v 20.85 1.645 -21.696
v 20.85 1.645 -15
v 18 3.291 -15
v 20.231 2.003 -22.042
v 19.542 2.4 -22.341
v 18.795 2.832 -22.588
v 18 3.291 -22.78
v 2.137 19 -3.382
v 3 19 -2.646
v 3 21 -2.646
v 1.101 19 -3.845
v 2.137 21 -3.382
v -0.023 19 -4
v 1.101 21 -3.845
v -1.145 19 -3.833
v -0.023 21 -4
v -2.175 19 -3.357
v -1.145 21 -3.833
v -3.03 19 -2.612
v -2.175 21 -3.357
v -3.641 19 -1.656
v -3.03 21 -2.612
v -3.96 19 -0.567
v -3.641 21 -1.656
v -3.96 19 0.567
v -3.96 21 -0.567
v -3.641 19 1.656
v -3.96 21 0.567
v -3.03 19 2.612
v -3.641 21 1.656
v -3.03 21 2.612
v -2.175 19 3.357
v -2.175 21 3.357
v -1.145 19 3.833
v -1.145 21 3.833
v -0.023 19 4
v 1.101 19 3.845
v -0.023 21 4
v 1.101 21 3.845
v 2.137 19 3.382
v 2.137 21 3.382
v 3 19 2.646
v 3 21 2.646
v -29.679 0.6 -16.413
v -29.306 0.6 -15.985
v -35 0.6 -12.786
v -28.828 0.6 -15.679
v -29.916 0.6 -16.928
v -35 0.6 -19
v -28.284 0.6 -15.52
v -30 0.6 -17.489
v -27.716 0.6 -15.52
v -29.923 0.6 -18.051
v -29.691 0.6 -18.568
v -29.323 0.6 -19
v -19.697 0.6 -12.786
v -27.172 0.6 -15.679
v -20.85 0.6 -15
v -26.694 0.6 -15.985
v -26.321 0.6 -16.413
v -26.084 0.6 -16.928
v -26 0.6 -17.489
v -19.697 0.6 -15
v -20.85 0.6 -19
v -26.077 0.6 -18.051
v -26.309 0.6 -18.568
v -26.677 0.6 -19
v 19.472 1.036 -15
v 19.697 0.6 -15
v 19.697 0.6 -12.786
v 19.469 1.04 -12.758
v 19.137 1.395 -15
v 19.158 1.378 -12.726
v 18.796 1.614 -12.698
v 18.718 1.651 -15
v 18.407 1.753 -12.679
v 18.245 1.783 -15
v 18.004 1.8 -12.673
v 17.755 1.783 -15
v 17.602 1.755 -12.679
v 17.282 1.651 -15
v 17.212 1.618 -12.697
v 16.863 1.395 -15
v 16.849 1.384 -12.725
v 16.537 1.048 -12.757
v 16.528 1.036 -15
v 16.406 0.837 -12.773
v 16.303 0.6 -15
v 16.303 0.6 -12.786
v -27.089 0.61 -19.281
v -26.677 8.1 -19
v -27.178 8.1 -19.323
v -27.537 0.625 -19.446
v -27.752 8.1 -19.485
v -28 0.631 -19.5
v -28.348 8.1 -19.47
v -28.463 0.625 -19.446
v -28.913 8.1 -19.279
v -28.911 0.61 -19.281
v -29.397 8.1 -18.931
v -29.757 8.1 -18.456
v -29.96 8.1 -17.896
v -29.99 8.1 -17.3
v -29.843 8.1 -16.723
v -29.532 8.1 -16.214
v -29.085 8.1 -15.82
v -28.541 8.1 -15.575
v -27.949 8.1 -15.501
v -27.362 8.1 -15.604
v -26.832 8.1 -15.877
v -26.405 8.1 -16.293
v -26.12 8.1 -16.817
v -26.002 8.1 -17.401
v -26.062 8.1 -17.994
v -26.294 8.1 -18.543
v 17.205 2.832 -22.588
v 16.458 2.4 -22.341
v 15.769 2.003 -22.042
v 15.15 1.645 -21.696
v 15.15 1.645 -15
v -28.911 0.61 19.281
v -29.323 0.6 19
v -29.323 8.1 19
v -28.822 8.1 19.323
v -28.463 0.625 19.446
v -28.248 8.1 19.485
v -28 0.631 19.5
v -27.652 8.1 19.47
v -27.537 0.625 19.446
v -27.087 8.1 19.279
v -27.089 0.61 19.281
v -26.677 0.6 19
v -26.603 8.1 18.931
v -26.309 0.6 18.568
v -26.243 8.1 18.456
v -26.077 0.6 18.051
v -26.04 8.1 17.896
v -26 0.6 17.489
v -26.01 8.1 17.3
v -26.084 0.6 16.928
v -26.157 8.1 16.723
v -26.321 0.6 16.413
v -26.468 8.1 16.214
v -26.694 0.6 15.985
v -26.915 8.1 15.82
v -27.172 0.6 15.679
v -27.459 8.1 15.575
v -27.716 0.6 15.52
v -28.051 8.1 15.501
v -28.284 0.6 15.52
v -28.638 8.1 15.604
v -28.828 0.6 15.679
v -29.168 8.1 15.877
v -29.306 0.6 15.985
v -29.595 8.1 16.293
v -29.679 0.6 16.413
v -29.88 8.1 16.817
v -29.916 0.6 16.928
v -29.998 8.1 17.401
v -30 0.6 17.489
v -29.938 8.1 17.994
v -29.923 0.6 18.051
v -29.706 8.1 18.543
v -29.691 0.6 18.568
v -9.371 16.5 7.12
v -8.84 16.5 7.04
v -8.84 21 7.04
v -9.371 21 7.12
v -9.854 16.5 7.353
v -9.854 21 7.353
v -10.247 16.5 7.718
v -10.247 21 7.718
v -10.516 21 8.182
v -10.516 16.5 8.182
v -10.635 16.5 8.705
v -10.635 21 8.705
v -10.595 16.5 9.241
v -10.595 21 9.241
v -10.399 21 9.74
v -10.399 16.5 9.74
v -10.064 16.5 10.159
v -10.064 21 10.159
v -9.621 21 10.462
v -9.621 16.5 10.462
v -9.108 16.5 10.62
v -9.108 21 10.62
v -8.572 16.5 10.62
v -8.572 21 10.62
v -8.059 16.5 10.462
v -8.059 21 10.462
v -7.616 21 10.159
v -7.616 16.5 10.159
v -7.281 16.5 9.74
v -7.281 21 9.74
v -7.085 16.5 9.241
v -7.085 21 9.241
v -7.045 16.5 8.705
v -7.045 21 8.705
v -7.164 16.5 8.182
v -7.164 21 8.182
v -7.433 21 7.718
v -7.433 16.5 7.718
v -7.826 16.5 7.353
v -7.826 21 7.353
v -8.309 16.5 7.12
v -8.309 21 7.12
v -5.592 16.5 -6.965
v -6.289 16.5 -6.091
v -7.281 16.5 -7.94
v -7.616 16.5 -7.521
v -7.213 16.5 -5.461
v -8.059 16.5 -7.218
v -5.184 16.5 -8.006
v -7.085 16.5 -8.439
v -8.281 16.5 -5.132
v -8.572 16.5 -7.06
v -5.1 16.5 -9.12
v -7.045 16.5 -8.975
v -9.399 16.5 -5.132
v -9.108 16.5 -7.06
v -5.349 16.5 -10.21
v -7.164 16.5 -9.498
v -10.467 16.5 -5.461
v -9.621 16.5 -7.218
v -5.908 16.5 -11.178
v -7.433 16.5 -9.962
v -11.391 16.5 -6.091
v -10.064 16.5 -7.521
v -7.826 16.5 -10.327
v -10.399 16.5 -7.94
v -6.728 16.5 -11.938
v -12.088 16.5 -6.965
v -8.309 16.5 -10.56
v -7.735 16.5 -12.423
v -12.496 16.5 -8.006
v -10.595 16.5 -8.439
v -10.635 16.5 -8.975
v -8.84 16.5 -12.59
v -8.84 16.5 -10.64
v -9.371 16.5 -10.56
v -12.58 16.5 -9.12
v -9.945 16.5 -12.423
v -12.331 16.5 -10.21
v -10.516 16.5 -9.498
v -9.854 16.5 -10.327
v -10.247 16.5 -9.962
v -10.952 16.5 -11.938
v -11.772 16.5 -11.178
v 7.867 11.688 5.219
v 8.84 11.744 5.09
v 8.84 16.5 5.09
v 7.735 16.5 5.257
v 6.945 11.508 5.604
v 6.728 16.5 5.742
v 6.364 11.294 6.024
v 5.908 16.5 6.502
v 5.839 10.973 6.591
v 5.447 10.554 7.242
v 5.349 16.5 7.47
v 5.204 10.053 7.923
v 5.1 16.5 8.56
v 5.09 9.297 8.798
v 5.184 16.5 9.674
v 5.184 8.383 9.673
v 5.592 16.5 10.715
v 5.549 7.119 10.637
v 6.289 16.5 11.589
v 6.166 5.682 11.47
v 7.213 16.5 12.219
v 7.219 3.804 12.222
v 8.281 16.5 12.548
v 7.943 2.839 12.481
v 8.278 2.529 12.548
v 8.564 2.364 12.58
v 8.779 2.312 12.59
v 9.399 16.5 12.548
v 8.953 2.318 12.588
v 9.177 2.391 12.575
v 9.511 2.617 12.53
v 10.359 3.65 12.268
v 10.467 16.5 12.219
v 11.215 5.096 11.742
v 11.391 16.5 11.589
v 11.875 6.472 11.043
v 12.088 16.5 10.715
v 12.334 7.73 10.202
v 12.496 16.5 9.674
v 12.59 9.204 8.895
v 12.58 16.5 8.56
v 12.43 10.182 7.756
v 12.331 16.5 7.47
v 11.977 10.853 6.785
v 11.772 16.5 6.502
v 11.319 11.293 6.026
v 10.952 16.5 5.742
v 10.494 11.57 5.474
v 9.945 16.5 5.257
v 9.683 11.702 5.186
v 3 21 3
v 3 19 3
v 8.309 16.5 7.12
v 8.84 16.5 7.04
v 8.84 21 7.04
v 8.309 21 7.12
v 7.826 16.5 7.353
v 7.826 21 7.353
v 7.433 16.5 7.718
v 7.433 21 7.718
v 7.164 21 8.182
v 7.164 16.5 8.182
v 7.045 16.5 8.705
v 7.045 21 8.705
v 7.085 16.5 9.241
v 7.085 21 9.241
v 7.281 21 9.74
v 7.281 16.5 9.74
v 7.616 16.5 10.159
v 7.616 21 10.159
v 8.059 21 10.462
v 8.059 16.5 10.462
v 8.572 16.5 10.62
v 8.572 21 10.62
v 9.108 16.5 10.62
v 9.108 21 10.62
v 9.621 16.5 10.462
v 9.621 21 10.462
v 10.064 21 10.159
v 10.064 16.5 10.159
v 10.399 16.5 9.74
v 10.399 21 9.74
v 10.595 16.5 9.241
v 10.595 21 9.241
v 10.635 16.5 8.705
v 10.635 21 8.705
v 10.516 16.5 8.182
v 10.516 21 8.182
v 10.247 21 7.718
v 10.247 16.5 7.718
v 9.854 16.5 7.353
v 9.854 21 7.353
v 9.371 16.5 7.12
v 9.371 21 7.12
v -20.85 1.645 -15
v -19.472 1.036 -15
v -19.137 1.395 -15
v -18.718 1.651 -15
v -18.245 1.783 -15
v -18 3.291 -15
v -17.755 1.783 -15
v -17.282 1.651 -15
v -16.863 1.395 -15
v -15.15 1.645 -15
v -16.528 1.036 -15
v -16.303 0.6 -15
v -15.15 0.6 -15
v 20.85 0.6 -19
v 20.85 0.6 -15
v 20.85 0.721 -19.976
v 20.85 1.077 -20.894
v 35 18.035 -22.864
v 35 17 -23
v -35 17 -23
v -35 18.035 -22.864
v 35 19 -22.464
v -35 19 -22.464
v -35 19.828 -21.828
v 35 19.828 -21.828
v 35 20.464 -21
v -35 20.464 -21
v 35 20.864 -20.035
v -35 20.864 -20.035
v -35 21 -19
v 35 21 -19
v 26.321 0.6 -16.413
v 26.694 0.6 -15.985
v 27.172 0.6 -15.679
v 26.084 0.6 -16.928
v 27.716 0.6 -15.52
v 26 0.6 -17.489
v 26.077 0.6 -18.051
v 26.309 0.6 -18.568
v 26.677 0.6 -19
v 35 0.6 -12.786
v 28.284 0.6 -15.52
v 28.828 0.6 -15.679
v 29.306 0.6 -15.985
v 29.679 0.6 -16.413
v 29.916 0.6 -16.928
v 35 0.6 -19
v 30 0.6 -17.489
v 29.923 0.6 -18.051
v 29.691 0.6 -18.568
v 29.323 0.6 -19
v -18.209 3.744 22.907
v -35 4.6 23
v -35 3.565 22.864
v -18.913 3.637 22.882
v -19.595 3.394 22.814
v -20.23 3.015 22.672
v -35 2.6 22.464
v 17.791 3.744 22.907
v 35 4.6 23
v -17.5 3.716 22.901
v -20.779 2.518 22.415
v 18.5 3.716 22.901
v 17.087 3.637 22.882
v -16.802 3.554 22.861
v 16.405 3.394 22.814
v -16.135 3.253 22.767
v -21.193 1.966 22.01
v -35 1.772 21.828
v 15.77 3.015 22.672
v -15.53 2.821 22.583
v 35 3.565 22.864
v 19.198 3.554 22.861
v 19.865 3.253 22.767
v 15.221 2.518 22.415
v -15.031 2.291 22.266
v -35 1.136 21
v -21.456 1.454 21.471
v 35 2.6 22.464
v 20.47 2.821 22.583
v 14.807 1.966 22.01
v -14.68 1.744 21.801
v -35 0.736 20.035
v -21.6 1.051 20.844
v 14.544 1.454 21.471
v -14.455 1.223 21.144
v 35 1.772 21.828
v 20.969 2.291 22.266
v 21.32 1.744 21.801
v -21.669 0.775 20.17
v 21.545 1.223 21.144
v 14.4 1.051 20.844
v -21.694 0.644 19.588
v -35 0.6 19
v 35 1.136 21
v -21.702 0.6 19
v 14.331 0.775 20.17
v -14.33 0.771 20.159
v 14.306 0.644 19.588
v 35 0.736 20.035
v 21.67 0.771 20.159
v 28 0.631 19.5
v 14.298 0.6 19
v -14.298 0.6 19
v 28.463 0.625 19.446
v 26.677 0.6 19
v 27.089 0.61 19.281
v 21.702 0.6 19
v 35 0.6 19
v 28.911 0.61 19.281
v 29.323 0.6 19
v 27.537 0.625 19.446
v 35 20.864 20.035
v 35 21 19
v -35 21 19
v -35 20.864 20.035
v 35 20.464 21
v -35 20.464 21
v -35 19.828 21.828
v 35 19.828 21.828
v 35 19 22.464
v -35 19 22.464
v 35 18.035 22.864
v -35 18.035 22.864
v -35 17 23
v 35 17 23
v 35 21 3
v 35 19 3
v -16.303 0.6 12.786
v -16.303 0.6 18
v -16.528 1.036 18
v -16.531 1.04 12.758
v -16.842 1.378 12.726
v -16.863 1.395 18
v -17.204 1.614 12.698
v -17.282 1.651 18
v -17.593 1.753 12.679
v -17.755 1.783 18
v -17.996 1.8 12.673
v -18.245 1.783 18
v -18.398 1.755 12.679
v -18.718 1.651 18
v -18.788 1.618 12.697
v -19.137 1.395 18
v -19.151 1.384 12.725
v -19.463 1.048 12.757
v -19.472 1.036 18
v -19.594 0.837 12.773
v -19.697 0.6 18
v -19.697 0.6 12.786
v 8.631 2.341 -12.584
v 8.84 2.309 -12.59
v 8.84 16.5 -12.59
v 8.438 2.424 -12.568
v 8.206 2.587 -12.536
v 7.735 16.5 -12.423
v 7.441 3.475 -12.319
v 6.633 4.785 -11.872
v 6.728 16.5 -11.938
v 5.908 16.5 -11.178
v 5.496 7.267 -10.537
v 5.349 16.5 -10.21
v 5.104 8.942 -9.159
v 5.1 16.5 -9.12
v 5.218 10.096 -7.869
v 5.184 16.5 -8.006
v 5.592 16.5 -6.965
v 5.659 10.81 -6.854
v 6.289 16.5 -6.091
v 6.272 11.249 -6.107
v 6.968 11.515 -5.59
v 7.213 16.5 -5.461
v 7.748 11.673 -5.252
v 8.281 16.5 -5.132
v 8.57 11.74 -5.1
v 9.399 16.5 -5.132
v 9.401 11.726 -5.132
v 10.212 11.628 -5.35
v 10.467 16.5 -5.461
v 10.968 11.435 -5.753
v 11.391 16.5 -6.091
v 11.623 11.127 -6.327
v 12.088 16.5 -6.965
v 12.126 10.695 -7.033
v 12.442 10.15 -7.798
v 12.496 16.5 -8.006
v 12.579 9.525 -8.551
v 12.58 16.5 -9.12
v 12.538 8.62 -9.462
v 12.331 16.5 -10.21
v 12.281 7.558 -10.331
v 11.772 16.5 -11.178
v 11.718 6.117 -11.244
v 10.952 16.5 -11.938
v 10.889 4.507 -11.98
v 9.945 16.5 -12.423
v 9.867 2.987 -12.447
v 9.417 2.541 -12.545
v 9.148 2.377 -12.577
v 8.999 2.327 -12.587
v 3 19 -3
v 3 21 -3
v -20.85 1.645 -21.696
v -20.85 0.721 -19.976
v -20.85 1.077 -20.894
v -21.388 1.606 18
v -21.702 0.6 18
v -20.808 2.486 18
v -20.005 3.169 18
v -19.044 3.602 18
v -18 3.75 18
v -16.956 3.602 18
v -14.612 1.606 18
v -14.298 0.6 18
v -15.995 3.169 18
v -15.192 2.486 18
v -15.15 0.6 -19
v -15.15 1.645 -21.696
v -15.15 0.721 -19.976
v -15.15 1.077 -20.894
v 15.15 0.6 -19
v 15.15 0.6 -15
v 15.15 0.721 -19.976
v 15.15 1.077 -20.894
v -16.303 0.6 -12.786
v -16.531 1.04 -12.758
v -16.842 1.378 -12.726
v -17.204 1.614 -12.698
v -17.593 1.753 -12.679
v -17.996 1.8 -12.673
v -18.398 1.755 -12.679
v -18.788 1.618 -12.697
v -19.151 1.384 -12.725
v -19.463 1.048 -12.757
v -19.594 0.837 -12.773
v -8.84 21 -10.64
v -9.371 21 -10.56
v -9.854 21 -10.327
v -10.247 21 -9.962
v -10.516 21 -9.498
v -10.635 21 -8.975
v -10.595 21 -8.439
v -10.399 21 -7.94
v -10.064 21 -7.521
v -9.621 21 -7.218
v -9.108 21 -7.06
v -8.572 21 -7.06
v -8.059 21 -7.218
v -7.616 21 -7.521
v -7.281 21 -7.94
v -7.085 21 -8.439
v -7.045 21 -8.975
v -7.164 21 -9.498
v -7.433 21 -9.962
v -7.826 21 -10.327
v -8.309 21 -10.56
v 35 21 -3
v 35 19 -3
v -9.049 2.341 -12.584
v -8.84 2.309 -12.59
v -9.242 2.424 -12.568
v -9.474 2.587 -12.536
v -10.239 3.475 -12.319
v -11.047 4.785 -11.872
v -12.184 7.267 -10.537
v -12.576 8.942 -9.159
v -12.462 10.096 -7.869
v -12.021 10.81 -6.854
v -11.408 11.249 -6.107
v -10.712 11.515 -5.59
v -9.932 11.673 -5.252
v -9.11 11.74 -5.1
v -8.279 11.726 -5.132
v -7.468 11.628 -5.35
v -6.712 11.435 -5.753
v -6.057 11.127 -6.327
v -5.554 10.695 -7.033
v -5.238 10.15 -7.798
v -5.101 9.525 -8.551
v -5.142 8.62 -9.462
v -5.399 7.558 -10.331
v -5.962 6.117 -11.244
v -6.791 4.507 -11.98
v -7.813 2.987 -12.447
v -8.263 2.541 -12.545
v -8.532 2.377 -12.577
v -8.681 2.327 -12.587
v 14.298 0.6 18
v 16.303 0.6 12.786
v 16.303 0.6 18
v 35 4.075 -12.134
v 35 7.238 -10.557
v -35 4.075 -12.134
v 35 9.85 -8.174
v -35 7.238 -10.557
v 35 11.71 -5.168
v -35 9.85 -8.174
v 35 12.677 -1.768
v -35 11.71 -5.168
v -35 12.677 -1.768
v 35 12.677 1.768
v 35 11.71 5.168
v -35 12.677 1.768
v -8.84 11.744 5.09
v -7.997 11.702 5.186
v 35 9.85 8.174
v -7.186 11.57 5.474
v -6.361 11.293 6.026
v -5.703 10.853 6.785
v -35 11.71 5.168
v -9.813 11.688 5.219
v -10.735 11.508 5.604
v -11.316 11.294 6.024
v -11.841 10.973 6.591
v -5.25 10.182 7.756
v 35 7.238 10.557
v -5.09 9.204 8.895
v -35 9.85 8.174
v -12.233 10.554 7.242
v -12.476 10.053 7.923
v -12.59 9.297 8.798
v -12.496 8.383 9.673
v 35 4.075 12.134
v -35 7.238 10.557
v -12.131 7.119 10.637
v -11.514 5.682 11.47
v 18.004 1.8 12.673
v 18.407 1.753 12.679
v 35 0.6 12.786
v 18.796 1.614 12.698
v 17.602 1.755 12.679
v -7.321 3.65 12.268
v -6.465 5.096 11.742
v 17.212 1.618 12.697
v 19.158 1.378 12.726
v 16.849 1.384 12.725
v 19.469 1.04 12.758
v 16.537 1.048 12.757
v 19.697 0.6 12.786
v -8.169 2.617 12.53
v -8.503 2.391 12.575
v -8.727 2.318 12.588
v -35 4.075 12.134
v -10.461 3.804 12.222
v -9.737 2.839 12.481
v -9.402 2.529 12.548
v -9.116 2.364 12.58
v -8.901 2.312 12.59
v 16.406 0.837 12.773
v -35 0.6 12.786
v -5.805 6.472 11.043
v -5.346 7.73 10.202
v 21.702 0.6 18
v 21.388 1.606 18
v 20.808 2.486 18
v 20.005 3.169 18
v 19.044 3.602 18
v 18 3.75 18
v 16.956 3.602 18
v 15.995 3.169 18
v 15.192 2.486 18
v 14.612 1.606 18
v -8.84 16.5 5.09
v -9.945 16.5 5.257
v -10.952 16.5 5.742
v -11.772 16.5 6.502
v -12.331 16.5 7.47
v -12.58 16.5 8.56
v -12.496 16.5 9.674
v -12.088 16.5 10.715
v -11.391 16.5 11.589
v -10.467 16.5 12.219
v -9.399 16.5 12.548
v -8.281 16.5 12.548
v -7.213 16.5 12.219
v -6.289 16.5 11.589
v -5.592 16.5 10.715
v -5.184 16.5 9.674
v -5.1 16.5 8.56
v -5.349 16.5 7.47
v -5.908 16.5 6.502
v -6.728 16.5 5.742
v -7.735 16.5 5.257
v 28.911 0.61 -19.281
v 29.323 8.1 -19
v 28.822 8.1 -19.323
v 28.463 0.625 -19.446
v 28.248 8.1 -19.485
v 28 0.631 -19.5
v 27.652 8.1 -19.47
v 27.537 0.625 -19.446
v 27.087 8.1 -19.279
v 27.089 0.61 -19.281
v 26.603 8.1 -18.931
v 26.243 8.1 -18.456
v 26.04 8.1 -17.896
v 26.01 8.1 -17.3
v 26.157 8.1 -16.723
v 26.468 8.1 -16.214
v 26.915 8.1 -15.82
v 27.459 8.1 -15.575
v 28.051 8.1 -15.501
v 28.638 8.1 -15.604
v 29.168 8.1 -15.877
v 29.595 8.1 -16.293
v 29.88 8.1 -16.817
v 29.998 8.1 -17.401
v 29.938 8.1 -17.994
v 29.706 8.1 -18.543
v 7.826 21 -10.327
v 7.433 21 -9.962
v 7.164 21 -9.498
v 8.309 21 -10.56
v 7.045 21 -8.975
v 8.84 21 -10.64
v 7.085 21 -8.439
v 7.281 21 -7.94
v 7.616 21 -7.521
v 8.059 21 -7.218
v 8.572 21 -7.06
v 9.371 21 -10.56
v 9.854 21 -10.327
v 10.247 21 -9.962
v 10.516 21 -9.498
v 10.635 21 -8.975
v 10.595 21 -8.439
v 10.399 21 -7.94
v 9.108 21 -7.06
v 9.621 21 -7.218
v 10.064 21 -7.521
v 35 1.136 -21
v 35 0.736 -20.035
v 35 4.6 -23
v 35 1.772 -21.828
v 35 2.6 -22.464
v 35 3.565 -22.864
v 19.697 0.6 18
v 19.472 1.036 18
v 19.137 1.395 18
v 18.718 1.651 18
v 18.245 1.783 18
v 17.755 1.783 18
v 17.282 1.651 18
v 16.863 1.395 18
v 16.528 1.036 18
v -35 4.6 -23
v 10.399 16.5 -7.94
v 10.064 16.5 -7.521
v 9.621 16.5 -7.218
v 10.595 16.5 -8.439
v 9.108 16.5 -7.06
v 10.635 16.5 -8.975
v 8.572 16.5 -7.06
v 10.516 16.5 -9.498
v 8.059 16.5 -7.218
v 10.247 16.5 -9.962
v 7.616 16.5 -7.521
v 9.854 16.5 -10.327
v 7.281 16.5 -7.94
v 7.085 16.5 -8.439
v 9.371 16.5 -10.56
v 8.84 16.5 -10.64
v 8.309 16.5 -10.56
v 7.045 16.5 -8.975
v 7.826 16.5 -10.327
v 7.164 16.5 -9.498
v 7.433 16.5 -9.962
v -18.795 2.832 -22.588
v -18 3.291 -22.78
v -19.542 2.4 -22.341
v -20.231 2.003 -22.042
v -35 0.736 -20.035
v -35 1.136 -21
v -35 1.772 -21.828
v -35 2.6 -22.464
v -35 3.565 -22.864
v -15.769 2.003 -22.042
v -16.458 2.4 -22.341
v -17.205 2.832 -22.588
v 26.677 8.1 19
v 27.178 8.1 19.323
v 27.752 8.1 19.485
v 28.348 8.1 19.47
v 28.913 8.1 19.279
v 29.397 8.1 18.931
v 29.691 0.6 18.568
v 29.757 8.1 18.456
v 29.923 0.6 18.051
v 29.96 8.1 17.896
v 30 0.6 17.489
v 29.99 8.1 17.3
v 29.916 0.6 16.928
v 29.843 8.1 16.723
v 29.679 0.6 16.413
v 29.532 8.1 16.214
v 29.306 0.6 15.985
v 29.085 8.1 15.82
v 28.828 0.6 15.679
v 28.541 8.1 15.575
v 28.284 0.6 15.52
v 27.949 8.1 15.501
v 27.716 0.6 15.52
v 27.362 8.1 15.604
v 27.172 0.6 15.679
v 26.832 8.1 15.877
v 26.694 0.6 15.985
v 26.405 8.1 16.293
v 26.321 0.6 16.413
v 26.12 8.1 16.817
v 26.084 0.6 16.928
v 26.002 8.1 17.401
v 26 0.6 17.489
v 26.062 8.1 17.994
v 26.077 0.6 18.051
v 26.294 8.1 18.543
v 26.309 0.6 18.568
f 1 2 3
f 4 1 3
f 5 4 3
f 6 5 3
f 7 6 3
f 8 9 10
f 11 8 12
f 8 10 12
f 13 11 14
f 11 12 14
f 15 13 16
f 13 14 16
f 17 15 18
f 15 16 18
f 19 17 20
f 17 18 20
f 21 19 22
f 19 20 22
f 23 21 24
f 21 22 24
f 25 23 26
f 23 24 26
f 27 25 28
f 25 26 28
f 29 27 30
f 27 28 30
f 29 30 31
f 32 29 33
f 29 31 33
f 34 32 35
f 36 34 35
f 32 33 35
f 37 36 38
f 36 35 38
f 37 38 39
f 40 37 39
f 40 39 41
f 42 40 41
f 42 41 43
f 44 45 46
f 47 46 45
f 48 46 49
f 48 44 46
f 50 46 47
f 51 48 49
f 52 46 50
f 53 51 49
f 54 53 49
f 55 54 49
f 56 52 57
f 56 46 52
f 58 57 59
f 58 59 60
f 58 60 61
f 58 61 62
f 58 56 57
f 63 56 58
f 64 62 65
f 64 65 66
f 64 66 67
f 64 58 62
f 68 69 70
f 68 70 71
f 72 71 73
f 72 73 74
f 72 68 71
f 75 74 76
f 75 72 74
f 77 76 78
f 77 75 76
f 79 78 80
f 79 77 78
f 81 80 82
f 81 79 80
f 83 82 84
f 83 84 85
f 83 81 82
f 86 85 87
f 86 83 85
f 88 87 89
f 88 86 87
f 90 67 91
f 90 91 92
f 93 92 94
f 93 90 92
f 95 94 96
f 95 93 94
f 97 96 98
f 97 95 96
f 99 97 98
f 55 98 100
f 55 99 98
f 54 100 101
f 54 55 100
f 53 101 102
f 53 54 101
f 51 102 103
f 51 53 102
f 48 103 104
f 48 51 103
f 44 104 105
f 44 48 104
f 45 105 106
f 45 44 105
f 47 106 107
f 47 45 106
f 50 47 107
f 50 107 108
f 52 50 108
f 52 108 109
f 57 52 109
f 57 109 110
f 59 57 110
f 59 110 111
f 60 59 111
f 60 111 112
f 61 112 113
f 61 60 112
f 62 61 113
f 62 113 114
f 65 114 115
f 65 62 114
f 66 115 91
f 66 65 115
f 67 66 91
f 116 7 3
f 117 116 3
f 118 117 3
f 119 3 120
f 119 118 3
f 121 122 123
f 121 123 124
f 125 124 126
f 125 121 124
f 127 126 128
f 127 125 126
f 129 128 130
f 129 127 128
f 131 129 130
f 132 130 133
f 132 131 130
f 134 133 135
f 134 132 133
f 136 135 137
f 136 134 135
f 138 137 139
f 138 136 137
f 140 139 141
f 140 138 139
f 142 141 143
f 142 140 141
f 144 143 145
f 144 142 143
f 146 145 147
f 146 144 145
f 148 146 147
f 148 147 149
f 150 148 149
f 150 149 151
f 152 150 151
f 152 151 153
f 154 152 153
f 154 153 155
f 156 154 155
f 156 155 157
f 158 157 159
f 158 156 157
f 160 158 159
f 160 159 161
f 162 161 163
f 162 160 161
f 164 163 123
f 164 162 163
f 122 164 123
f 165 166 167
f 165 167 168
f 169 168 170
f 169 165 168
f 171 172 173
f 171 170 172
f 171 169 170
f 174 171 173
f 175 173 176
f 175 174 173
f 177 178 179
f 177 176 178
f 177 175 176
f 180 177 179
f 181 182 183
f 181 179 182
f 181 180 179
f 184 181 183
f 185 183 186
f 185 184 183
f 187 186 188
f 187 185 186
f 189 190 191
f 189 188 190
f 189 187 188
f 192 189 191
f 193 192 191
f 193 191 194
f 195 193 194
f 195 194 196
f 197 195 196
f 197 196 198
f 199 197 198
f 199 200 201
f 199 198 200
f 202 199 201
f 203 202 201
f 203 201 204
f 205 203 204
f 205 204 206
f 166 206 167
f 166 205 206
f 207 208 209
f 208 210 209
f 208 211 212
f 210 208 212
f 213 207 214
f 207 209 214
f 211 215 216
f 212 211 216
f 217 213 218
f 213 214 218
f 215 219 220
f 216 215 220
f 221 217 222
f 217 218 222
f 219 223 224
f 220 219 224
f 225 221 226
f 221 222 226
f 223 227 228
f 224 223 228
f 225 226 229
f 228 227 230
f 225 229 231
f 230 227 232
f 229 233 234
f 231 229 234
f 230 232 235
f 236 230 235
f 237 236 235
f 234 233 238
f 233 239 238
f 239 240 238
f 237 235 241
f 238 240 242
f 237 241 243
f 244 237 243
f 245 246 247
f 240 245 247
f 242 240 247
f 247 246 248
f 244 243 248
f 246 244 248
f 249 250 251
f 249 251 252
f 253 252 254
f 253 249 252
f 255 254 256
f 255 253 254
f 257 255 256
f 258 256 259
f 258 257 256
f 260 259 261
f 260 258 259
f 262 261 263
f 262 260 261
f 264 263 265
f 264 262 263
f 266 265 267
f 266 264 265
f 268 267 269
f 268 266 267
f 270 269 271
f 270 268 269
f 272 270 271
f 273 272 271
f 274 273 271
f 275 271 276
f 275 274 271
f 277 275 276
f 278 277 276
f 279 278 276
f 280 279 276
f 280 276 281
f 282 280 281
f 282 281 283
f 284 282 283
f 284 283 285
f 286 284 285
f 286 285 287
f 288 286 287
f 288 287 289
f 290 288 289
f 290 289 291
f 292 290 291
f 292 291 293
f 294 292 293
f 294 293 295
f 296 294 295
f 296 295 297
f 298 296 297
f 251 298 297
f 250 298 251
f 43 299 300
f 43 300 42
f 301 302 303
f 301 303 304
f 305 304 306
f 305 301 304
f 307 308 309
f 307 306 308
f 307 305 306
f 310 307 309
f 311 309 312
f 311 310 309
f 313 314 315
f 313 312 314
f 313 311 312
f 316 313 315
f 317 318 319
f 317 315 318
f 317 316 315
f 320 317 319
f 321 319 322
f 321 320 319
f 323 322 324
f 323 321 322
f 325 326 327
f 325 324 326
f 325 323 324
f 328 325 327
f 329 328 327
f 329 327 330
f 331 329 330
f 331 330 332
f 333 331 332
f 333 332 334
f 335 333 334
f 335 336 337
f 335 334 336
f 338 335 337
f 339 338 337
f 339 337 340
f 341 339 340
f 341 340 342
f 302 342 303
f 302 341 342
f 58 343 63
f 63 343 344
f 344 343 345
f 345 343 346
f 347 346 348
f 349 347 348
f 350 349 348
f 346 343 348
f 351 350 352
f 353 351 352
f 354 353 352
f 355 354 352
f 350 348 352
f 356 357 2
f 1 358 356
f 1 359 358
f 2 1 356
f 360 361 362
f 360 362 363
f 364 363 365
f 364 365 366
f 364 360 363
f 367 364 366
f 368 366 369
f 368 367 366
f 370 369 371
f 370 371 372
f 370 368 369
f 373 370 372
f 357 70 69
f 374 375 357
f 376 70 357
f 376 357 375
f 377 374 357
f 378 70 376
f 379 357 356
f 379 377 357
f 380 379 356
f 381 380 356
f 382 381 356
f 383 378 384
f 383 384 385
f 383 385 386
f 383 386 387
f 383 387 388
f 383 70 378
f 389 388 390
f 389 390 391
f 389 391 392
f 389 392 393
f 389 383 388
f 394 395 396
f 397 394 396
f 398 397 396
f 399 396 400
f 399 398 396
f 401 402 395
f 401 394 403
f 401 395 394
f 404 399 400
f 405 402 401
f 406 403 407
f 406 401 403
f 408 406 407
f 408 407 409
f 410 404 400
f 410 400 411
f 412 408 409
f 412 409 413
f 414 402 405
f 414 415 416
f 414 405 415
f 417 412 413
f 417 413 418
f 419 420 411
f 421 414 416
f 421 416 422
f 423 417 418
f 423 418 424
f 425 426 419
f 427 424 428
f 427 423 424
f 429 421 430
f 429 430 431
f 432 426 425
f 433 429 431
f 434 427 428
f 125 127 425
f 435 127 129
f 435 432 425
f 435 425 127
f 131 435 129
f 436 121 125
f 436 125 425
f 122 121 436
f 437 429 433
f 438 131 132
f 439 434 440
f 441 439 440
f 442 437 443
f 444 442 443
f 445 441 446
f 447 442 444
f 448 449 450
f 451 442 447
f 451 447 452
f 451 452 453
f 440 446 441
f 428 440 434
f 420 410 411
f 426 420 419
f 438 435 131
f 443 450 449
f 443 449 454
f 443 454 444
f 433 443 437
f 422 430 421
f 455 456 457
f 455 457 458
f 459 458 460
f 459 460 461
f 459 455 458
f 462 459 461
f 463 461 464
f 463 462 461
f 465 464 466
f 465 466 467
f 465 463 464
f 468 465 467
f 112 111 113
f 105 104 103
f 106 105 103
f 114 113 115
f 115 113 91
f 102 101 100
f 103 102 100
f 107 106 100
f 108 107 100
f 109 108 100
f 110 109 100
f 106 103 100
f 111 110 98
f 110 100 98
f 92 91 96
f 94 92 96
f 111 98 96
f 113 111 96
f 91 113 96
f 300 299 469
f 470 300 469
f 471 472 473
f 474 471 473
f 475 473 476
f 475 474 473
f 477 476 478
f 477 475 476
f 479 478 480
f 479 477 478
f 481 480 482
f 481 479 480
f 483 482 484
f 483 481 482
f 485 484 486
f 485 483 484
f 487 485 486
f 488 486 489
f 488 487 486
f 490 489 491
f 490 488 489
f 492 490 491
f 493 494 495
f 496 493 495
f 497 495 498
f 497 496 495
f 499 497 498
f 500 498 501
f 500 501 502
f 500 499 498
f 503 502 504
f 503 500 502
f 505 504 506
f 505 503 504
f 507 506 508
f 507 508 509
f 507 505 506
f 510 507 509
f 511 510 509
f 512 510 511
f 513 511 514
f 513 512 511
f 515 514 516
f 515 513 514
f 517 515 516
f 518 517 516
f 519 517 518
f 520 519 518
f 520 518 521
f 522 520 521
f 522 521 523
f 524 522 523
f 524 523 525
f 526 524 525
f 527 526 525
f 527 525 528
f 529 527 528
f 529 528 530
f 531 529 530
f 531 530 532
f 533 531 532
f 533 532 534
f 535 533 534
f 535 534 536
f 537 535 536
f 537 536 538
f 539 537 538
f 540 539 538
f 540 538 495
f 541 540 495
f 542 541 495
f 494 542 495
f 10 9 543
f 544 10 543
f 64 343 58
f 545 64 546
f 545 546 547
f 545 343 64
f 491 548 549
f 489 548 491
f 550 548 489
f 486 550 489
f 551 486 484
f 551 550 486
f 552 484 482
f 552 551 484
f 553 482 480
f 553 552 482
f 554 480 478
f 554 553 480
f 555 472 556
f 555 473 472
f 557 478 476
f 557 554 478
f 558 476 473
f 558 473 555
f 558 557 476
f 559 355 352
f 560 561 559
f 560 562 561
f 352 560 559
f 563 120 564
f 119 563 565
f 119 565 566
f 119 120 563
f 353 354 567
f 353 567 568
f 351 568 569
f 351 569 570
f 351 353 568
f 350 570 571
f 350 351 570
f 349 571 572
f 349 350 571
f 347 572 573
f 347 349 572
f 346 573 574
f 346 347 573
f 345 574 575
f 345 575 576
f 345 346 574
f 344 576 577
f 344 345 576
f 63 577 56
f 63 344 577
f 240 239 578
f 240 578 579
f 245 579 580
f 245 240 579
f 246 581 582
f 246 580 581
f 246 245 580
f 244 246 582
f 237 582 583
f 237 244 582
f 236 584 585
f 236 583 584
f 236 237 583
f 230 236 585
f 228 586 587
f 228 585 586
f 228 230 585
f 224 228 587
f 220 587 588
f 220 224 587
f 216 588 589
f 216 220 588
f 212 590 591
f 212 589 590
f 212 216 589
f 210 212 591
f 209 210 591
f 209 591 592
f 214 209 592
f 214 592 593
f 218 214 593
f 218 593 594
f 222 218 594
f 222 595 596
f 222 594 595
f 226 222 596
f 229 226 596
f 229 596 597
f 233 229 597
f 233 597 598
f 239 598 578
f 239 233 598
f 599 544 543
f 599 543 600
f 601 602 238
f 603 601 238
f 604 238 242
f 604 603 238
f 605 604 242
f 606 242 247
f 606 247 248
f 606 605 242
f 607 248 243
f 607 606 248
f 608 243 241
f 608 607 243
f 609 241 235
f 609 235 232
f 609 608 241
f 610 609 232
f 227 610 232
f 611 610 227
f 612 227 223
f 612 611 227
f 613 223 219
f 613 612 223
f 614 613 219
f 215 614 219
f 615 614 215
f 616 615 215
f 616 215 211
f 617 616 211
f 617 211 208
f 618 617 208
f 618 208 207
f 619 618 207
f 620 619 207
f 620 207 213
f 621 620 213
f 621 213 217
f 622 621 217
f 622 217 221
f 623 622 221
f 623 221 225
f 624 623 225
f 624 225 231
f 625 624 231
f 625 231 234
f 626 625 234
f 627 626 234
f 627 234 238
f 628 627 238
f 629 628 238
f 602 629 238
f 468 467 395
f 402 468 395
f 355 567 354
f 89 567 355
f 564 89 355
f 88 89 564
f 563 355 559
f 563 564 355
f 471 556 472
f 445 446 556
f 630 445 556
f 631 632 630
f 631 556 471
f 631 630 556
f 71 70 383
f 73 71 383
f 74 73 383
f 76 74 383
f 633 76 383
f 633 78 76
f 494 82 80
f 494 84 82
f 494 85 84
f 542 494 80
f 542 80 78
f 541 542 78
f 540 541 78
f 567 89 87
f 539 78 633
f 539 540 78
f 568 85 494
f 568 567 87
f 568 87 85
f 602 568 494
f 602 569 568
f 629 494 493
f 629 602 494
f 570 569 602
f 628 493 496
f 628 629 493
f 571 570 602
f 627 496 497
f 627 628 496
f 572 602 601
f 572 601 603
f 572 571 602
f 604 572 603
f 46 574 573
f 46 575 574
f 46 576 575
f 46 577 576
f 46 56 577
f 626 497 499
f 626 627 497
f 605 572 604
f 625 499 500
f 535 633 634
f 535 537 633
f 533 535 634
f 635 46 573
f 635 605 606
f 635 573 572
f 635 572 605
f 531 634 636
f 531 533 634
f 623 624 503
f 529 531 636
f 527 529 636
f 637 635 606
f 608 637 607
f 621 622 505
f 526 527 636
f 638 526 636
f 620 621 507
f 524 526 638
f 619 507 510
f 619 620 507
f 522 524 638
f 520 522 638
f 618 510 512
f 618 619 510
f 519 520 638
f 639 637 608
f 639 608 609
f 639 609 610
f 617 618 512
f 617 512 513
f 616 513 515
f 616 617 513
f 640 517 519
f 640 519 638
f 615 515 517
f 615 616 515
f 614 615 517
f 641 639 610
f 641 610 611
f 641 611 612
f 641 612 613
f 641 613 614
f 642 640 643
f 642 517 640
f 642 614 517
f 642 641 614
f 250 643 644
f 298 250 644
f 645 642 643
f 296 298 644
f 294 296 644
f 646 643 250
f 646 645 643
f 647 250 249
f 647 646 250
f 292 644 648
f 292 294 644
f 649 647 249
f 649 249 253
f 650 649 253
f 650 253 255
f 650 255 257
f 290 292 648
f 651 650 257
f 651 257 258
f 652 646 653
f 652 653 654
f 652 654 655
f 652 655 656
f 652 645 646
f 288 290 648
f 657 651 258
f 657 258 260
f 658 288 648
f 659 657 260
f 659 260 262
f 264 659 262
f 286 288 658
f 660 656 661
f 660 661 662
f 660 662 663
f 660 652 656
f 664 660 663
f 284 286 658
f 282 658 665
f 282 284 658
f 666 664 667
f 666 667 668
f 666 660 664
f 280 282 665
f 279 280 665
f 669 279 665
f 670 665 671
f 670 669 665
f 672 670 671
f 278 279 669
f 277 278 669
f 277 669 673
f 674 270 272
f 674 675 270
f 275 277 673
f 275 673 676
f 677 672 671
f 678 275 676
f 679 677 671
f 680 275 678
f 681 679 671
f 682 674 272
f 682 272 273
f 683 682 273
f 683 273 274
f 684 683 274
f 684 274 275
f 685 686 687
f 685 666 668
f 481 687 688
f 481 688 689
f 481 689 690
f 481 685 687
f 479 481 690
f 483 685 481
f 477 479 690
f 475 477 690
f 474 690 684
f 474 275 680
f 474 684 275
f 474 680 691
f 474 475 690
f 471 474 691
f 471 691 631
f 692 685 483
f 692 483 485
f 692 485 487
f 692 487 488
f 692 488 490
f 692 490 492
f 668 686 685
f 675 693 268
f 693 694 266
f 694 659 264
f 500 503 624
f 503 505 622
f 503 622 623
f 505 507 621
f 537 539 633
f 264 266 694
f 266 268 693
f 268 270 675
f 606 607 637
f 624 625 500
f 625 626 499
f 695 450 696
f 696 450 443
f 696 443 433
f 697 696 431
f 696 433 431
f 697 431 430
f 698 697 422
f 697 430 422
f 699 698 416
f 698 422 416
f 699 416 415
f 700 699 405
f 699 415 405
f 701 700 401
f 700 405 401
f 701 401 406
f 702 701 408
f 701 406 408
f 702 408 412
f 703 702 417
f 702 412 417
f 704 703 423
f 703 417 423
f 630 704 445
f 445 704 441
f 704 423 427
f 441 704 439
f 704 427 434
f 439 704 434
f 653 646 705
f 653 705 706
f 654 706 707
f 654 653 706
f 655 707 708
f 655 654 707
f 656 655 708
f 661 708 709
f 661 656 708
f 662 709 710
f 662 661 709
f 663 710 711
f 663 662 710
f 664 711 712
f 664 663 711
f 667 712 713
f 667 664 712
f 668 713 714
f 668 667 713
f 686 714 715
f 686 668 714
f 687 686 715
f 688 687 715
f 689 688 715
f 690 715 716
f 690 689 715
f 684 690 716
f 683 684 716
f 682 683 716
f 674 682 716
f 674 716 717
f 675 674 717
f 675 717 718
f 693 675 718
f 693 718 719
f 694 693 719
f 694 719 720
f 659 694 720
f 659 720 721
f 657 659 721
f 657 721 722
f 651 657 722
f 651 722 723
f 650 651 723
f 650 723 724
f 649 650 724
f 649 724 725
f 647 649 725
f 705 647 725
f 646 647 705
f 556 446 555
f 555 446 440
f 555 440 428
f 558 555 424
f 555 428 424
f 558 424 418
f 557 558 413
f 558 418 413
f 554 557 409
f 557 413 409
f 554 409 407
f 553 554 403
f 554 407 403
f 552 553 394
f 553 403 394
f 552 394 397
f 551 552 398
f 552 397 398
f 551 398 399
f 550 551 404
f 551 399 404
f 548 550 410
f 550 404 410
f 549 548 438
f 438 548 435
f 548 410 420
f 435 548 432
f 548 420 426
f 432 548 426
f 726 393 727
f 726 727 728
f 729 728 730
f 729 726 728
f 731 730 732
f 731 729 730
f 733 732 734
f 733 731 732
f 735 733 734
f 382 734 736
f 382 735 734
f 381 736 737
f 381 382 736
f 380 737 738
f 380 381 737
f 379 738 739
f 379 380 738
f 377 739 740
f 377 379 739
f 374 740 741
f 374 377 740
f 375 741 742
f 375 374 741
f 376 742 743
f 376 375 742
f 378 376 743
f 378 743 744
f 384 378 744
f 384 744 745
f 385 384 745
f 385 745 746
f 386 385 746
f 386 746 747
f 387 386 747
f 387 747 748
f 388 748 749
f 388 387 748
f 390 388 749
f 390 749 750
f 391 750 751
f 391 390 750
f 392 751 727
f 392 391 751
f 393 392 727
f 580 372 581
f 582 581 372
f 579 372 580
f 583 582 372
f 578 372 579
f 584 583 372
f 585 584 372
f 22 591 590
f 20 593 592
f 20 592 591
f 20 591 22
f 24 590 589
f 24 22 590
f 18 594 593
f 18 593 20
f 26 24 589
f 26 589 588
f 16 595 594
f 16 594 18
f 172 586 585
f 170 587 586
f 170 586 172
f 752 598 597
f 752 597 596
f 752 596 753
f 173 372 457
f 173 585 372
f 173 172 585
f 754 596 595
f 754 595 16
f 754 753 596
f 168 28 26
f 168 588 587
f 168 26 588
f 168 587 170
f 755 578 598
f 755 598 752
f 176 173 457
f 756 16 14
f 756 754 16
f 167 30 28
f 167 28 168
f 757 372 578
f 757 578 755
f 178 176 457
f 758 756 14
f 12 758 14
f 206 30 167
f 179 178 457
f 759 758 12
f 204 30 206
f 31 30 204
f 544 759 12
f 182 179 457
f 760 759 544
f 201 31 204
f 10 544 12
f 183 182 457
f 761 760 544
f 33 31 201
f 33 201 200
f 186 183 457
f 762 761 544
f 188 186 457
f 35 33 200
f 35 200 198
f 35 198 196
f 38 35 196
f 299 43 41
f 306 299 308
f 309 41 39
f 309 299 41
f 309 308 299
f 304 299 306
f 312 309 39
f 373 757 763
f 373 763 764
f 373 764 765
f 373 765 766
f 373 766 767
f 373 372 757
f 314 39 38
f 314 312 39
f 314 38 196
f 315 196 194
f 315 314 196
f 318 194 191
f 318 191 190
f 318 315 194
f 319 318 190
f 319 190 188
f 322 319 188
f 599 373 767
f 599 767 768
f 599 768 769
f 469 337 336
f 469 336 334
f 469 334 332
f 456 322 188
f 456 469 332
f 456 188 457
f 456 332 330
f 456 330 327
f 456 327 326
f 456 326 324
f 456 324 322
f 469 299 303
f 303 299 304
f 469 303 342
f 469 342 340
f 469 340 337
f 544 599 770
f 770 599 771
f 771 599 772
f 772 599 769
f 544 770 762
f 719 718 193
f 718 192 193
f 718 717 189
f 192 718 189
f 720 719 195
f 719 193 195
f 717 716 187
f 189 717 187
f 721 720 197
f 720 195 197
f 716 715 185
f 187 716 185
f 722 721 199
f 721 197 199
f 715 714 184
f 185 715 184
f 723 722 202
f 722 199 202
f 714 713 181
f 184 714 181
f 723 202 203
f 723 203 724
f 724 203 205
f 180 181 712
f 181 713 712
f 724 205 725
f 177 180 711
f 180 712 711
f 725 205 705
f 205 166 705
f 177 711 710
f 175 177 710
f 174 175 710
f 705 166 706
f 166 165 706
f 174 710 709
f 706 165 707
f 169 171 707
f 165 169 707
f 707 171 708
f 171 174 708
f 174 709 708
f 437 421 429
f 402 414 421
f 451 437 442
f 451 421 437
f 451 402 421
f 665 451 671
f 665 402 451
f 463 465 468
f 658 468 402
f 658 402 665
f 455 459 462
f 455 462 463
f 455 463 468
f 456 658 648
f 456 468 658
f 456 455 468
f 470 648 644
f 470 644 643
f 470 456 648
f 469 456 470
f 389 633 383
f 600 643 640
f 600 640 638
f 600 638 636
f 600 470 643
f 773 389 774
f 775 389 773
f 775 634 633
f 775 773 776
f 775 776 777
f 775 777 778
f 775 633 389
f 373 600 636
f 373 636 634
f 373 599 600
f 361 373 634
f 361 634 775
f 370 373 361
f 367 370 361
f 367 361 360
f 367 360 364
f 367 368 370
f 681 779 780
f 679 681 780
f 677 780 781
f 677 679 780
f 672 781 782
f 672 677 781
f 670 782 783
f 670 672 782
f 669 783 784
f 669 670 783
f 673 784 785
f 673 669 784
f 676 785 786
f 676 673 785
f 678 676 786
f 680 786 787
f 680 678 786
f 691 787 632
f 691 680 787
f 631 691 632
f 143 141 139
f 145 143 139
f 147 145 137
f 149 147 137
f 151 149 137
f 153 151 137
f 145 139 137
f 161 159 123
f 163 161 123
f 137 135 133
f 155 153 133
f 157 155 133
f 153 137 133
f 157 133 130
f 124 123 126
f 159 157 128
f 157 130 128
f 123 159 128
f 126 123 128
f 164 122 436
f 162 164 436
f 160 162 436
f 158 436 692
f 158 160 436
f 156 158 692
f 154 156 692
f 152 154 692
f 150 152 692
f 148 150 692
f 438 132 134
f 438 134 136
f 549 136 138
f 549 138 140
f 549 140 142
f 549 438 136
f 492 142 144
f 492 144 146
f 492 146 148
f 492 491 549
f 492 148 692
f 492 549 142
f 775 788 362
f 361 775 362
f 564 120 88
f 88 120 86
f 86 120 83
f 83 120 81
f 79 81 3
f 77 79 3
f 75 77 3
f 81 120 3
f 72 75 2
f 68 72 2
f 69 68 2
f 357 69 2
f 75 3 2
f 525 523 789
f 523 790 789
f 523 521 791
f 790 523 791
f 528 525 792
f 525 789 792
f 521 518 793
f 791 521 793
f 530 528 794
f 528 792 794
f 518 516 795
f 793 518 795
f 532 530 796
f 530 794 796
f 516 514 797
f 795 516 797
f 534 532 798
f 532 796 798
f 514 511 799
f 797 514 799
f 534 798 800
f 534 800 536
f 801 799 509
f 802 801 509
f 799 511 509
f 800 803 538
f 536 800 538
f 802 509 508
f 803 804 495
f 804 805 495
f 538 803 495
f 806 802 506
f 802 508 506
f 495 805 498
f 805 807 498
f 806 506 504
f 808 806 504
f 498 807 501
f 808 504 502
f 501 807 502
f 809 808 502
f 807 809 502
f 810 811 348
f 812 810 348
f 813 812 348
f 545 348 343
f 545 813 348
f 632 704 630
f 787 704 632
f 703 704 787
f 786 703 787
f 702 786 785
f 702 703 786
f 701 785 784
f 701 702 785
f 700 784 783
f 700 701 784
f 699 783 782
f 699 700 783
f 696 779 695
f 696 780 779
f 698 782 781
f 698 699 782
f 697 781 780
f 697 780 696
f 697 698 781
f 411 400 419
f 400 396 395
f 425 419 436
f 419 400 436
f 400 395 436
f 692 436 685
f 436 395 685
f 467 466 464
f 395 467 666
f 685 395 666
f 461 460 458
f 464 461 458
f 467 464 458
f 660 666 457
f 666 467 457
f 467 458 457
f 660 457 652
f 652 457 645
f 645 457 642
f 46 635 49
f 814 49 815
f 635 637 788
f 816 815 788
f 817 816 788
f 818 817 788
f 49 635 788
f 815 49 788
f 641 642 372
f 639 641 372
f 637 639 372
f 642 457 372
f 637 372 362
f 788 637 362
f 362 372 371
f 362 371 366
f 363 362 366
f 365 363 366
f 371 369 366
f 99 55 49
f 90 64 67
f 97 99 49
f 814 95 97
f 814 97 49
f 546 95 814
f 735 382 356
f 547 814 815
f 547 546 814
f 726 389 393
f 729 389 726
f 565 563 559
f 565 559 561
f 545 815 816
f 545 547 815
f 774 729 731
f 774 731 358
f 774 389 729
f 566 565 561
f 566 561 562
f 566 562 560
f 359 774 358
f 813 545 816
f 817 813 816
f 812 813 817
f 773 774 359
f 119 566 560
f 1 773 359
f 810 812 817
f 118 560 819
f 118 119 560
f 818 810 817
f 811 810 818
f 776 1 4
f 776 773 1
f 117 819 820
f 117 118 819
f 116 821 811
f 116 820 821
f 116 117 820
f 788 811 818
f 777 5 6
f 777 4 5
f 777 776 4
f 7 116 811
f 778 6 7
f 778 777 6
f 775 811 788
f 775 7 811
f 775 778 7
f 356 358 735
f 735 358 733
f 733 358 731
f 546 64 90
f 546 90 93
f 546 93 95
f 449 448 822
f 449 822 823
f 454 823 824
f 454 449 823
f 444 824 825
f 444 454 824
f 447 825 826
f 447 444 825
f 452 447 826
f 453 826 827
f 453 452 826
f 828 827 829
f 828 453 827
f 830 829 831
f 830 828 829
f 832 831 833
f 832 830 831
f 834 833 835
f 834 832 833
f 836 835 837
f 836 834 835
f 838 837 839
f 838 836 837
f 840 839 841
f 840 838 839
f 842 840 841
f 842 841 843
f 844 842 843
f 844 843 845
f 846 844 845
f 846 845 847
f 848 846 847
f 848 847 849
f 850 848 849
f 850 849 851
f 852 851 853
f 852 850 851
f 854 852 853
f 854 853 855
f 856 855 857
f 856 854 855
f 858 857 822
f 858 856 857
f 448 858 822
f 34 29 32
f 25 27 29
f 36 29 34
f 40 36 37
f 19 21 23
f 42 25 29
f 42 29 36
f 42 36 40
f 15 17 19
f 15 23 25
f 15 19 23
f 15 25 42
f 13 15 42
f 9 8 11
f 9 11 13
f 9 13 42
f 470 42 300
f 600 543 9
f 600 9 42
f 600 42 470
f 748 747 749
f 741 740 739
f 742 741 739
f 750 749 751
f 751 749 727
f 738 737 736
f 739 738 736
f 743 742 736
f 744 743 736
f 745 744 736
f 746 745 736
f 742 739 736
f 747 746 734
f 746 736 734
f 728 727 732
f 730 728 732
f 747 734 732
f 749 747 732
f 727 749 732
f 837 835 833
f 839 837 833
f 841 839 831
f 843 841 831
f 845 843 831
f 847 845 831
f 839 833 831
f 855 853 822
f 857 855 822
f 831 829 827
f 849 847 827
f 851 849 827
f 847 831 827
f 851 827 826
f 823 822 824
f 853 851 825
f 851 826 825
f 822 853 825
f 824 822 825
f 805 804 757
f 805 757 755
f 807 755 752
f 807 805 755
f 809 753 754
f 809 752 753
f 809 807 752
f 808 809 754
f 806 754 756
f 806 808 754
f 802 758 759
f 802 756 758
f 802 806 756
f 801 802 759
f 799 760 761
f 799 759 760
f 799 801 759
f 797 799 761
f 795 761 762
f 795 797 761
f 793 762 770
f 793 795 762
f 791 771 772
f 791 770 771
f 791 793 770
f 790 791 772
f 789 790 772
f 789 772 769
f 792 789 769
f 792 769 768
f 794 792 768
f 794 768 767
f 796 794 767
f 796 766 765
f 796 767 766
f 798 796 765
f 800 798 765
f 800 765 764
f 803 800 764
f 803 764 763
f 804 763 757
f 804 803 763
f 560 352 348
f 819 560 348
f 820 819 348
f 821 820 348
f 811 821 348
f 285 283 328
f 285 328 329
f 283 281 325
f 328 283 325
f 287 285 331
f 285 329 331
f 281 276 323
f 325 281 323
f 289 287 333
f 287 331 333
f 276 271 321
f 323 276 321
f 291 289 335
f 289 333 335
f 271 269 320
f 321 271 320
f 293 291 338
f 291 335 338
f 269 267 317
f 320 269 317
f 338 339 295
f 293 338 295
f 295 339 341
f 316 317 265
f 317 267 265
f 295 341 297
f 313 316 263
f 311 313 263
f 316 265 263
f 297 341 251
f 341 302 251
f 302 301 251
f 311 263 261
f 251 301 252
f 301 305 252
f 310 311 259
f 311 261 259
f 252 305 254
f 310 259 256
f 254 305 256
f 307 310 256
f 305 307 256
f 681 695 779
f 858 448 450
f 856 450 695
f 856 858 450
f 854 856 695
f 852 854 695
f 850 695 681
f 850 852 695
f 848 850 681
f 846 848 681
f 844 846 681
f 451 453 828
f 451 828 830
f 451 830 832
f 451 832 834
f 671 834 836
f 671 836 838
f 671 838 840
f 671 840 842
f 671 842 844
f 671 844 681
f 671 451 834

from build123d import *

# Parameters (mm, degrees)
BOSS_EXTRUDE1_DEPTH     = 35
CUT_EXTRUDE1_DEPTH      = 47.8508271
CUT_EXTRUDE1_DEPTH_BACK = 47.8508271
SKETCH2_R               = 12.8
SKETCH3_R               = 2
CUT_EXTRUDE2_DEPTH      = 7.5
SKETCH4_R               = 3.75
CUT_EXTRUDE3_DEPTH      = 16.5
SKETCH5_R               = 1.8
CUT_EXTRUDE4_DEPTH      = 22
SKETCH6_R               = 4
CUT_EXTRUDE5_DEPTH      = 2
SKETCH7_W               = 32
SKETCH7_H               = 6
CUT_EXTRUDE6_DEPTH      = 2
CUT_EXTRUDE7_DEPTH      = 47.850827224
CUT_EXTRUDE7_DEPTH_BACK = 47.850827224
SKETCH8_R               = 1.8
SKETCH9_R               = 3.75
CUT_EXTRUDE8_DEPTH      = 5
CUT_EXTRUDE9_DEPTH      = 8


with BuildPart() as part:
    # Sketch1 → Boss-Extrude1 (new, symmetric)
    with BuildSketch(Plane(origin=(0, 0, 0), x_dir=(0, 0, -1), z_dir=(1, 0, 0))):
        with BuildLine():
            Line((-19, 0.6), (19, 0.6))
            ThreePointArc((19, 0.6), (21.828427125, 1.771572875), (23, 4.6))
            Line((23, 4.6), (23, 17))
            ThreePointArc((23, 17), (21.828427125, 19.828427125), (19, 21))
            Line((19, 21), (-19, 21))
            ThreePointArc((-19, 21), (-21.828427125, 19.828427125), (-23, 17))
            Line((-23, 17), (-23, 4.6))
            ThreePointArc((-23, 4.6), (-21.828427125, 1.771572875), (-19, 0.6))
        make_face()
    extrude(amount=BOSS_EXTRUDE1_DEPTH, both=True)

    # Sketch2 → Cut-Extrude1 (cut, two sides: drawn at the far end of the back side and taken through both)
    with BuildSketch(Plane(origin=(0, 0, 0), x_dir=(0, 0, -1), z_dir=(1, 0, 0)).offset(-CUT_EXTRUDE1_DEPTH_BACK)):
        Circle(SKETCH2_R)
    extrude(amount=CUT_EXTRUDE1_DEPTH + CUT_EXTRUDE1_DEPTH_BACK, mode=Mode.SUBTRACT)

    # Sketch3 → Cut-Extrude2 (cut)
    with BuildSketch(Plane(origin=(0, 0.6, 0), x_dir=(1, 0, 0), z_dir=(0, 1, 0))):
        with Locations(Location((28, -17.5, 0), (0, 0, 228.590377891))):
            Circle(SKETCH3_R)
        with Locations(Location((28, 17.5, 0), (0, 0, 48.590377891))):
            Circle(SKETCH3_R)
        with Locations(Location((-28, -17.5, 0), (0, 0, 228.590377891))):
            Circle(SKETCH3_R)
        with Locations(Location((-28, 17.5, 0), (0, 0, 48.590377891))):
            Circle(SKETCH3_R)
    extrude(amount=CUT_EXTRUDE2_DEPTH, mode=Mode.SUBTRACT)

    # Sketch4 → Cut-Extrude3 (cut)
    with BuildSketch(Plane(origin=(0, 0, 0), x_dir=(1, 0, 0), z_dir=(0, 1, 0))):
        with Locations(Location((8.84, -8.84, 0), (0, 0, 90))):
            Circle(SKETCH4_R)
        with Locations(Location((8.84, 8.84, 0), (0, 0, 90))):
            Circle(SKETCH4_R)
        with Locations(Location((-8.84, -8.84, 0), (0, 0, 90))):
            Circle(SKETCH4_R)
        with Locations(Location((-8.84, 8.84, 0), (0, 0, 90))):
            Circle(SKETCH4_R)
    extrude(amount=CUT_EXTRUDE3_DEPTH, mode=Mode.SUBTRACT)

    # Sketch5 → Cut-Extrude4 (cut)
    with BuildSketch(Plane(origin=(0, 0, 0), x_dir=(1, 0, 0), z_dir=(0, 1, 0))):
        with Locations(Location((8.84, -8.84, 0), (0, 0, 90))):
            Circle(SKETCH5_R)
        with Locations(Location((8.84, 8.84, 0), (0, 0, 90))):
            Circle(SKETCH5_R)
        with Locations(Location((-8.84, -8.84, 0), (0, 0, 90))):
            Circle(SKETCH5_R)
        with Locations(Location((-8.84, 8.84, 0), (0, 0, 90))):
            Circle(SKETCH5_R)
    extrude(amount=CUT_EXTRUDE4_DEPTH, mode=Mode.SUBTRACT)

    # Sketch6 → Cut-Extrude5 (cut)
    with BuildSketch(Plane(origin=(0, 21, 0), x_dir=(1, 0, 0), z_dir=(0, 1, 0))):
        with Locations(Location((0, 0, 0), (0, 0, 270))):
            Circle(SKETCH6_R)
    extrude(amount=-CUT_EXTRUDE5_DEPTH, mode=Mode.SUBTRACT)

    # Sketch7 → Cut-Extrude6 (cut)
    with BuildSketch(Plane(origin=(0, 21, 0), x_dir=(1, 0, 0), z_dir=(0, 1, 0))):
        with Locations((19, 0)):
            Rectangle(SKETCH7_W, SKETCH7_H)
    extrude(amount=-CUT_EXTRUDE6_DEPTH, mode=Mode.SUBTRACT)

    # Sketch8 → Cut-Extrude7 (cut, two sides: drawn at the far end of the back side and taken through both)
    with BuildSketch(Plane.XY.offset(-CUT_EXTRUDE7_DEPTH_BACK)):
        with Locations((18, 0)):
            Circle(SKETCH8_R)
        with Locations((-18, 0)):
            Circle(SKETCH8_R)
    extrude(amount=CUT_EXTRUDE7_DEPTH + CUT_EXTRUDE7_DEPTH_BACK, mode=Mode.SUBTRACT)

    # Sketch9 → Cut-Extrude8 (cut)
    with BuildSketch(Plane.XY.offset(23)):
        with Locations((18, 0)):
            Circle(SKETCH9_R)
        with Locations((-18, 0)):
            Circle(SKETCH9_R)
    extrude(amount=-CUT_EXTRUDE8_DEPTH, mode=Mode.SUBTRACT)

    # Sketch10 → Cut-Extrude9 (cut)
    with BuildSketch(Plane.XY.offset(-23)):
        Polygon((20.85, 1.645448267), (18, 3.290896534), (15.15, 1.645448267), (15.15, -1.645448267), (18, -3.290896534), (20.85, -1.645448267), align=None)
        Polygon((-15.15, 1.645448267), (-18, 3.290896534), (-20.85, 1.645448267), (-20.85, -1.645448267), (-18, -3.290896534), (-15.15, -1.645448267), align=None)
    extrude(amount=CUT_EXTRUDE9_DEPTH, mode=Mode.SUBTRACT)


solid = part.part
